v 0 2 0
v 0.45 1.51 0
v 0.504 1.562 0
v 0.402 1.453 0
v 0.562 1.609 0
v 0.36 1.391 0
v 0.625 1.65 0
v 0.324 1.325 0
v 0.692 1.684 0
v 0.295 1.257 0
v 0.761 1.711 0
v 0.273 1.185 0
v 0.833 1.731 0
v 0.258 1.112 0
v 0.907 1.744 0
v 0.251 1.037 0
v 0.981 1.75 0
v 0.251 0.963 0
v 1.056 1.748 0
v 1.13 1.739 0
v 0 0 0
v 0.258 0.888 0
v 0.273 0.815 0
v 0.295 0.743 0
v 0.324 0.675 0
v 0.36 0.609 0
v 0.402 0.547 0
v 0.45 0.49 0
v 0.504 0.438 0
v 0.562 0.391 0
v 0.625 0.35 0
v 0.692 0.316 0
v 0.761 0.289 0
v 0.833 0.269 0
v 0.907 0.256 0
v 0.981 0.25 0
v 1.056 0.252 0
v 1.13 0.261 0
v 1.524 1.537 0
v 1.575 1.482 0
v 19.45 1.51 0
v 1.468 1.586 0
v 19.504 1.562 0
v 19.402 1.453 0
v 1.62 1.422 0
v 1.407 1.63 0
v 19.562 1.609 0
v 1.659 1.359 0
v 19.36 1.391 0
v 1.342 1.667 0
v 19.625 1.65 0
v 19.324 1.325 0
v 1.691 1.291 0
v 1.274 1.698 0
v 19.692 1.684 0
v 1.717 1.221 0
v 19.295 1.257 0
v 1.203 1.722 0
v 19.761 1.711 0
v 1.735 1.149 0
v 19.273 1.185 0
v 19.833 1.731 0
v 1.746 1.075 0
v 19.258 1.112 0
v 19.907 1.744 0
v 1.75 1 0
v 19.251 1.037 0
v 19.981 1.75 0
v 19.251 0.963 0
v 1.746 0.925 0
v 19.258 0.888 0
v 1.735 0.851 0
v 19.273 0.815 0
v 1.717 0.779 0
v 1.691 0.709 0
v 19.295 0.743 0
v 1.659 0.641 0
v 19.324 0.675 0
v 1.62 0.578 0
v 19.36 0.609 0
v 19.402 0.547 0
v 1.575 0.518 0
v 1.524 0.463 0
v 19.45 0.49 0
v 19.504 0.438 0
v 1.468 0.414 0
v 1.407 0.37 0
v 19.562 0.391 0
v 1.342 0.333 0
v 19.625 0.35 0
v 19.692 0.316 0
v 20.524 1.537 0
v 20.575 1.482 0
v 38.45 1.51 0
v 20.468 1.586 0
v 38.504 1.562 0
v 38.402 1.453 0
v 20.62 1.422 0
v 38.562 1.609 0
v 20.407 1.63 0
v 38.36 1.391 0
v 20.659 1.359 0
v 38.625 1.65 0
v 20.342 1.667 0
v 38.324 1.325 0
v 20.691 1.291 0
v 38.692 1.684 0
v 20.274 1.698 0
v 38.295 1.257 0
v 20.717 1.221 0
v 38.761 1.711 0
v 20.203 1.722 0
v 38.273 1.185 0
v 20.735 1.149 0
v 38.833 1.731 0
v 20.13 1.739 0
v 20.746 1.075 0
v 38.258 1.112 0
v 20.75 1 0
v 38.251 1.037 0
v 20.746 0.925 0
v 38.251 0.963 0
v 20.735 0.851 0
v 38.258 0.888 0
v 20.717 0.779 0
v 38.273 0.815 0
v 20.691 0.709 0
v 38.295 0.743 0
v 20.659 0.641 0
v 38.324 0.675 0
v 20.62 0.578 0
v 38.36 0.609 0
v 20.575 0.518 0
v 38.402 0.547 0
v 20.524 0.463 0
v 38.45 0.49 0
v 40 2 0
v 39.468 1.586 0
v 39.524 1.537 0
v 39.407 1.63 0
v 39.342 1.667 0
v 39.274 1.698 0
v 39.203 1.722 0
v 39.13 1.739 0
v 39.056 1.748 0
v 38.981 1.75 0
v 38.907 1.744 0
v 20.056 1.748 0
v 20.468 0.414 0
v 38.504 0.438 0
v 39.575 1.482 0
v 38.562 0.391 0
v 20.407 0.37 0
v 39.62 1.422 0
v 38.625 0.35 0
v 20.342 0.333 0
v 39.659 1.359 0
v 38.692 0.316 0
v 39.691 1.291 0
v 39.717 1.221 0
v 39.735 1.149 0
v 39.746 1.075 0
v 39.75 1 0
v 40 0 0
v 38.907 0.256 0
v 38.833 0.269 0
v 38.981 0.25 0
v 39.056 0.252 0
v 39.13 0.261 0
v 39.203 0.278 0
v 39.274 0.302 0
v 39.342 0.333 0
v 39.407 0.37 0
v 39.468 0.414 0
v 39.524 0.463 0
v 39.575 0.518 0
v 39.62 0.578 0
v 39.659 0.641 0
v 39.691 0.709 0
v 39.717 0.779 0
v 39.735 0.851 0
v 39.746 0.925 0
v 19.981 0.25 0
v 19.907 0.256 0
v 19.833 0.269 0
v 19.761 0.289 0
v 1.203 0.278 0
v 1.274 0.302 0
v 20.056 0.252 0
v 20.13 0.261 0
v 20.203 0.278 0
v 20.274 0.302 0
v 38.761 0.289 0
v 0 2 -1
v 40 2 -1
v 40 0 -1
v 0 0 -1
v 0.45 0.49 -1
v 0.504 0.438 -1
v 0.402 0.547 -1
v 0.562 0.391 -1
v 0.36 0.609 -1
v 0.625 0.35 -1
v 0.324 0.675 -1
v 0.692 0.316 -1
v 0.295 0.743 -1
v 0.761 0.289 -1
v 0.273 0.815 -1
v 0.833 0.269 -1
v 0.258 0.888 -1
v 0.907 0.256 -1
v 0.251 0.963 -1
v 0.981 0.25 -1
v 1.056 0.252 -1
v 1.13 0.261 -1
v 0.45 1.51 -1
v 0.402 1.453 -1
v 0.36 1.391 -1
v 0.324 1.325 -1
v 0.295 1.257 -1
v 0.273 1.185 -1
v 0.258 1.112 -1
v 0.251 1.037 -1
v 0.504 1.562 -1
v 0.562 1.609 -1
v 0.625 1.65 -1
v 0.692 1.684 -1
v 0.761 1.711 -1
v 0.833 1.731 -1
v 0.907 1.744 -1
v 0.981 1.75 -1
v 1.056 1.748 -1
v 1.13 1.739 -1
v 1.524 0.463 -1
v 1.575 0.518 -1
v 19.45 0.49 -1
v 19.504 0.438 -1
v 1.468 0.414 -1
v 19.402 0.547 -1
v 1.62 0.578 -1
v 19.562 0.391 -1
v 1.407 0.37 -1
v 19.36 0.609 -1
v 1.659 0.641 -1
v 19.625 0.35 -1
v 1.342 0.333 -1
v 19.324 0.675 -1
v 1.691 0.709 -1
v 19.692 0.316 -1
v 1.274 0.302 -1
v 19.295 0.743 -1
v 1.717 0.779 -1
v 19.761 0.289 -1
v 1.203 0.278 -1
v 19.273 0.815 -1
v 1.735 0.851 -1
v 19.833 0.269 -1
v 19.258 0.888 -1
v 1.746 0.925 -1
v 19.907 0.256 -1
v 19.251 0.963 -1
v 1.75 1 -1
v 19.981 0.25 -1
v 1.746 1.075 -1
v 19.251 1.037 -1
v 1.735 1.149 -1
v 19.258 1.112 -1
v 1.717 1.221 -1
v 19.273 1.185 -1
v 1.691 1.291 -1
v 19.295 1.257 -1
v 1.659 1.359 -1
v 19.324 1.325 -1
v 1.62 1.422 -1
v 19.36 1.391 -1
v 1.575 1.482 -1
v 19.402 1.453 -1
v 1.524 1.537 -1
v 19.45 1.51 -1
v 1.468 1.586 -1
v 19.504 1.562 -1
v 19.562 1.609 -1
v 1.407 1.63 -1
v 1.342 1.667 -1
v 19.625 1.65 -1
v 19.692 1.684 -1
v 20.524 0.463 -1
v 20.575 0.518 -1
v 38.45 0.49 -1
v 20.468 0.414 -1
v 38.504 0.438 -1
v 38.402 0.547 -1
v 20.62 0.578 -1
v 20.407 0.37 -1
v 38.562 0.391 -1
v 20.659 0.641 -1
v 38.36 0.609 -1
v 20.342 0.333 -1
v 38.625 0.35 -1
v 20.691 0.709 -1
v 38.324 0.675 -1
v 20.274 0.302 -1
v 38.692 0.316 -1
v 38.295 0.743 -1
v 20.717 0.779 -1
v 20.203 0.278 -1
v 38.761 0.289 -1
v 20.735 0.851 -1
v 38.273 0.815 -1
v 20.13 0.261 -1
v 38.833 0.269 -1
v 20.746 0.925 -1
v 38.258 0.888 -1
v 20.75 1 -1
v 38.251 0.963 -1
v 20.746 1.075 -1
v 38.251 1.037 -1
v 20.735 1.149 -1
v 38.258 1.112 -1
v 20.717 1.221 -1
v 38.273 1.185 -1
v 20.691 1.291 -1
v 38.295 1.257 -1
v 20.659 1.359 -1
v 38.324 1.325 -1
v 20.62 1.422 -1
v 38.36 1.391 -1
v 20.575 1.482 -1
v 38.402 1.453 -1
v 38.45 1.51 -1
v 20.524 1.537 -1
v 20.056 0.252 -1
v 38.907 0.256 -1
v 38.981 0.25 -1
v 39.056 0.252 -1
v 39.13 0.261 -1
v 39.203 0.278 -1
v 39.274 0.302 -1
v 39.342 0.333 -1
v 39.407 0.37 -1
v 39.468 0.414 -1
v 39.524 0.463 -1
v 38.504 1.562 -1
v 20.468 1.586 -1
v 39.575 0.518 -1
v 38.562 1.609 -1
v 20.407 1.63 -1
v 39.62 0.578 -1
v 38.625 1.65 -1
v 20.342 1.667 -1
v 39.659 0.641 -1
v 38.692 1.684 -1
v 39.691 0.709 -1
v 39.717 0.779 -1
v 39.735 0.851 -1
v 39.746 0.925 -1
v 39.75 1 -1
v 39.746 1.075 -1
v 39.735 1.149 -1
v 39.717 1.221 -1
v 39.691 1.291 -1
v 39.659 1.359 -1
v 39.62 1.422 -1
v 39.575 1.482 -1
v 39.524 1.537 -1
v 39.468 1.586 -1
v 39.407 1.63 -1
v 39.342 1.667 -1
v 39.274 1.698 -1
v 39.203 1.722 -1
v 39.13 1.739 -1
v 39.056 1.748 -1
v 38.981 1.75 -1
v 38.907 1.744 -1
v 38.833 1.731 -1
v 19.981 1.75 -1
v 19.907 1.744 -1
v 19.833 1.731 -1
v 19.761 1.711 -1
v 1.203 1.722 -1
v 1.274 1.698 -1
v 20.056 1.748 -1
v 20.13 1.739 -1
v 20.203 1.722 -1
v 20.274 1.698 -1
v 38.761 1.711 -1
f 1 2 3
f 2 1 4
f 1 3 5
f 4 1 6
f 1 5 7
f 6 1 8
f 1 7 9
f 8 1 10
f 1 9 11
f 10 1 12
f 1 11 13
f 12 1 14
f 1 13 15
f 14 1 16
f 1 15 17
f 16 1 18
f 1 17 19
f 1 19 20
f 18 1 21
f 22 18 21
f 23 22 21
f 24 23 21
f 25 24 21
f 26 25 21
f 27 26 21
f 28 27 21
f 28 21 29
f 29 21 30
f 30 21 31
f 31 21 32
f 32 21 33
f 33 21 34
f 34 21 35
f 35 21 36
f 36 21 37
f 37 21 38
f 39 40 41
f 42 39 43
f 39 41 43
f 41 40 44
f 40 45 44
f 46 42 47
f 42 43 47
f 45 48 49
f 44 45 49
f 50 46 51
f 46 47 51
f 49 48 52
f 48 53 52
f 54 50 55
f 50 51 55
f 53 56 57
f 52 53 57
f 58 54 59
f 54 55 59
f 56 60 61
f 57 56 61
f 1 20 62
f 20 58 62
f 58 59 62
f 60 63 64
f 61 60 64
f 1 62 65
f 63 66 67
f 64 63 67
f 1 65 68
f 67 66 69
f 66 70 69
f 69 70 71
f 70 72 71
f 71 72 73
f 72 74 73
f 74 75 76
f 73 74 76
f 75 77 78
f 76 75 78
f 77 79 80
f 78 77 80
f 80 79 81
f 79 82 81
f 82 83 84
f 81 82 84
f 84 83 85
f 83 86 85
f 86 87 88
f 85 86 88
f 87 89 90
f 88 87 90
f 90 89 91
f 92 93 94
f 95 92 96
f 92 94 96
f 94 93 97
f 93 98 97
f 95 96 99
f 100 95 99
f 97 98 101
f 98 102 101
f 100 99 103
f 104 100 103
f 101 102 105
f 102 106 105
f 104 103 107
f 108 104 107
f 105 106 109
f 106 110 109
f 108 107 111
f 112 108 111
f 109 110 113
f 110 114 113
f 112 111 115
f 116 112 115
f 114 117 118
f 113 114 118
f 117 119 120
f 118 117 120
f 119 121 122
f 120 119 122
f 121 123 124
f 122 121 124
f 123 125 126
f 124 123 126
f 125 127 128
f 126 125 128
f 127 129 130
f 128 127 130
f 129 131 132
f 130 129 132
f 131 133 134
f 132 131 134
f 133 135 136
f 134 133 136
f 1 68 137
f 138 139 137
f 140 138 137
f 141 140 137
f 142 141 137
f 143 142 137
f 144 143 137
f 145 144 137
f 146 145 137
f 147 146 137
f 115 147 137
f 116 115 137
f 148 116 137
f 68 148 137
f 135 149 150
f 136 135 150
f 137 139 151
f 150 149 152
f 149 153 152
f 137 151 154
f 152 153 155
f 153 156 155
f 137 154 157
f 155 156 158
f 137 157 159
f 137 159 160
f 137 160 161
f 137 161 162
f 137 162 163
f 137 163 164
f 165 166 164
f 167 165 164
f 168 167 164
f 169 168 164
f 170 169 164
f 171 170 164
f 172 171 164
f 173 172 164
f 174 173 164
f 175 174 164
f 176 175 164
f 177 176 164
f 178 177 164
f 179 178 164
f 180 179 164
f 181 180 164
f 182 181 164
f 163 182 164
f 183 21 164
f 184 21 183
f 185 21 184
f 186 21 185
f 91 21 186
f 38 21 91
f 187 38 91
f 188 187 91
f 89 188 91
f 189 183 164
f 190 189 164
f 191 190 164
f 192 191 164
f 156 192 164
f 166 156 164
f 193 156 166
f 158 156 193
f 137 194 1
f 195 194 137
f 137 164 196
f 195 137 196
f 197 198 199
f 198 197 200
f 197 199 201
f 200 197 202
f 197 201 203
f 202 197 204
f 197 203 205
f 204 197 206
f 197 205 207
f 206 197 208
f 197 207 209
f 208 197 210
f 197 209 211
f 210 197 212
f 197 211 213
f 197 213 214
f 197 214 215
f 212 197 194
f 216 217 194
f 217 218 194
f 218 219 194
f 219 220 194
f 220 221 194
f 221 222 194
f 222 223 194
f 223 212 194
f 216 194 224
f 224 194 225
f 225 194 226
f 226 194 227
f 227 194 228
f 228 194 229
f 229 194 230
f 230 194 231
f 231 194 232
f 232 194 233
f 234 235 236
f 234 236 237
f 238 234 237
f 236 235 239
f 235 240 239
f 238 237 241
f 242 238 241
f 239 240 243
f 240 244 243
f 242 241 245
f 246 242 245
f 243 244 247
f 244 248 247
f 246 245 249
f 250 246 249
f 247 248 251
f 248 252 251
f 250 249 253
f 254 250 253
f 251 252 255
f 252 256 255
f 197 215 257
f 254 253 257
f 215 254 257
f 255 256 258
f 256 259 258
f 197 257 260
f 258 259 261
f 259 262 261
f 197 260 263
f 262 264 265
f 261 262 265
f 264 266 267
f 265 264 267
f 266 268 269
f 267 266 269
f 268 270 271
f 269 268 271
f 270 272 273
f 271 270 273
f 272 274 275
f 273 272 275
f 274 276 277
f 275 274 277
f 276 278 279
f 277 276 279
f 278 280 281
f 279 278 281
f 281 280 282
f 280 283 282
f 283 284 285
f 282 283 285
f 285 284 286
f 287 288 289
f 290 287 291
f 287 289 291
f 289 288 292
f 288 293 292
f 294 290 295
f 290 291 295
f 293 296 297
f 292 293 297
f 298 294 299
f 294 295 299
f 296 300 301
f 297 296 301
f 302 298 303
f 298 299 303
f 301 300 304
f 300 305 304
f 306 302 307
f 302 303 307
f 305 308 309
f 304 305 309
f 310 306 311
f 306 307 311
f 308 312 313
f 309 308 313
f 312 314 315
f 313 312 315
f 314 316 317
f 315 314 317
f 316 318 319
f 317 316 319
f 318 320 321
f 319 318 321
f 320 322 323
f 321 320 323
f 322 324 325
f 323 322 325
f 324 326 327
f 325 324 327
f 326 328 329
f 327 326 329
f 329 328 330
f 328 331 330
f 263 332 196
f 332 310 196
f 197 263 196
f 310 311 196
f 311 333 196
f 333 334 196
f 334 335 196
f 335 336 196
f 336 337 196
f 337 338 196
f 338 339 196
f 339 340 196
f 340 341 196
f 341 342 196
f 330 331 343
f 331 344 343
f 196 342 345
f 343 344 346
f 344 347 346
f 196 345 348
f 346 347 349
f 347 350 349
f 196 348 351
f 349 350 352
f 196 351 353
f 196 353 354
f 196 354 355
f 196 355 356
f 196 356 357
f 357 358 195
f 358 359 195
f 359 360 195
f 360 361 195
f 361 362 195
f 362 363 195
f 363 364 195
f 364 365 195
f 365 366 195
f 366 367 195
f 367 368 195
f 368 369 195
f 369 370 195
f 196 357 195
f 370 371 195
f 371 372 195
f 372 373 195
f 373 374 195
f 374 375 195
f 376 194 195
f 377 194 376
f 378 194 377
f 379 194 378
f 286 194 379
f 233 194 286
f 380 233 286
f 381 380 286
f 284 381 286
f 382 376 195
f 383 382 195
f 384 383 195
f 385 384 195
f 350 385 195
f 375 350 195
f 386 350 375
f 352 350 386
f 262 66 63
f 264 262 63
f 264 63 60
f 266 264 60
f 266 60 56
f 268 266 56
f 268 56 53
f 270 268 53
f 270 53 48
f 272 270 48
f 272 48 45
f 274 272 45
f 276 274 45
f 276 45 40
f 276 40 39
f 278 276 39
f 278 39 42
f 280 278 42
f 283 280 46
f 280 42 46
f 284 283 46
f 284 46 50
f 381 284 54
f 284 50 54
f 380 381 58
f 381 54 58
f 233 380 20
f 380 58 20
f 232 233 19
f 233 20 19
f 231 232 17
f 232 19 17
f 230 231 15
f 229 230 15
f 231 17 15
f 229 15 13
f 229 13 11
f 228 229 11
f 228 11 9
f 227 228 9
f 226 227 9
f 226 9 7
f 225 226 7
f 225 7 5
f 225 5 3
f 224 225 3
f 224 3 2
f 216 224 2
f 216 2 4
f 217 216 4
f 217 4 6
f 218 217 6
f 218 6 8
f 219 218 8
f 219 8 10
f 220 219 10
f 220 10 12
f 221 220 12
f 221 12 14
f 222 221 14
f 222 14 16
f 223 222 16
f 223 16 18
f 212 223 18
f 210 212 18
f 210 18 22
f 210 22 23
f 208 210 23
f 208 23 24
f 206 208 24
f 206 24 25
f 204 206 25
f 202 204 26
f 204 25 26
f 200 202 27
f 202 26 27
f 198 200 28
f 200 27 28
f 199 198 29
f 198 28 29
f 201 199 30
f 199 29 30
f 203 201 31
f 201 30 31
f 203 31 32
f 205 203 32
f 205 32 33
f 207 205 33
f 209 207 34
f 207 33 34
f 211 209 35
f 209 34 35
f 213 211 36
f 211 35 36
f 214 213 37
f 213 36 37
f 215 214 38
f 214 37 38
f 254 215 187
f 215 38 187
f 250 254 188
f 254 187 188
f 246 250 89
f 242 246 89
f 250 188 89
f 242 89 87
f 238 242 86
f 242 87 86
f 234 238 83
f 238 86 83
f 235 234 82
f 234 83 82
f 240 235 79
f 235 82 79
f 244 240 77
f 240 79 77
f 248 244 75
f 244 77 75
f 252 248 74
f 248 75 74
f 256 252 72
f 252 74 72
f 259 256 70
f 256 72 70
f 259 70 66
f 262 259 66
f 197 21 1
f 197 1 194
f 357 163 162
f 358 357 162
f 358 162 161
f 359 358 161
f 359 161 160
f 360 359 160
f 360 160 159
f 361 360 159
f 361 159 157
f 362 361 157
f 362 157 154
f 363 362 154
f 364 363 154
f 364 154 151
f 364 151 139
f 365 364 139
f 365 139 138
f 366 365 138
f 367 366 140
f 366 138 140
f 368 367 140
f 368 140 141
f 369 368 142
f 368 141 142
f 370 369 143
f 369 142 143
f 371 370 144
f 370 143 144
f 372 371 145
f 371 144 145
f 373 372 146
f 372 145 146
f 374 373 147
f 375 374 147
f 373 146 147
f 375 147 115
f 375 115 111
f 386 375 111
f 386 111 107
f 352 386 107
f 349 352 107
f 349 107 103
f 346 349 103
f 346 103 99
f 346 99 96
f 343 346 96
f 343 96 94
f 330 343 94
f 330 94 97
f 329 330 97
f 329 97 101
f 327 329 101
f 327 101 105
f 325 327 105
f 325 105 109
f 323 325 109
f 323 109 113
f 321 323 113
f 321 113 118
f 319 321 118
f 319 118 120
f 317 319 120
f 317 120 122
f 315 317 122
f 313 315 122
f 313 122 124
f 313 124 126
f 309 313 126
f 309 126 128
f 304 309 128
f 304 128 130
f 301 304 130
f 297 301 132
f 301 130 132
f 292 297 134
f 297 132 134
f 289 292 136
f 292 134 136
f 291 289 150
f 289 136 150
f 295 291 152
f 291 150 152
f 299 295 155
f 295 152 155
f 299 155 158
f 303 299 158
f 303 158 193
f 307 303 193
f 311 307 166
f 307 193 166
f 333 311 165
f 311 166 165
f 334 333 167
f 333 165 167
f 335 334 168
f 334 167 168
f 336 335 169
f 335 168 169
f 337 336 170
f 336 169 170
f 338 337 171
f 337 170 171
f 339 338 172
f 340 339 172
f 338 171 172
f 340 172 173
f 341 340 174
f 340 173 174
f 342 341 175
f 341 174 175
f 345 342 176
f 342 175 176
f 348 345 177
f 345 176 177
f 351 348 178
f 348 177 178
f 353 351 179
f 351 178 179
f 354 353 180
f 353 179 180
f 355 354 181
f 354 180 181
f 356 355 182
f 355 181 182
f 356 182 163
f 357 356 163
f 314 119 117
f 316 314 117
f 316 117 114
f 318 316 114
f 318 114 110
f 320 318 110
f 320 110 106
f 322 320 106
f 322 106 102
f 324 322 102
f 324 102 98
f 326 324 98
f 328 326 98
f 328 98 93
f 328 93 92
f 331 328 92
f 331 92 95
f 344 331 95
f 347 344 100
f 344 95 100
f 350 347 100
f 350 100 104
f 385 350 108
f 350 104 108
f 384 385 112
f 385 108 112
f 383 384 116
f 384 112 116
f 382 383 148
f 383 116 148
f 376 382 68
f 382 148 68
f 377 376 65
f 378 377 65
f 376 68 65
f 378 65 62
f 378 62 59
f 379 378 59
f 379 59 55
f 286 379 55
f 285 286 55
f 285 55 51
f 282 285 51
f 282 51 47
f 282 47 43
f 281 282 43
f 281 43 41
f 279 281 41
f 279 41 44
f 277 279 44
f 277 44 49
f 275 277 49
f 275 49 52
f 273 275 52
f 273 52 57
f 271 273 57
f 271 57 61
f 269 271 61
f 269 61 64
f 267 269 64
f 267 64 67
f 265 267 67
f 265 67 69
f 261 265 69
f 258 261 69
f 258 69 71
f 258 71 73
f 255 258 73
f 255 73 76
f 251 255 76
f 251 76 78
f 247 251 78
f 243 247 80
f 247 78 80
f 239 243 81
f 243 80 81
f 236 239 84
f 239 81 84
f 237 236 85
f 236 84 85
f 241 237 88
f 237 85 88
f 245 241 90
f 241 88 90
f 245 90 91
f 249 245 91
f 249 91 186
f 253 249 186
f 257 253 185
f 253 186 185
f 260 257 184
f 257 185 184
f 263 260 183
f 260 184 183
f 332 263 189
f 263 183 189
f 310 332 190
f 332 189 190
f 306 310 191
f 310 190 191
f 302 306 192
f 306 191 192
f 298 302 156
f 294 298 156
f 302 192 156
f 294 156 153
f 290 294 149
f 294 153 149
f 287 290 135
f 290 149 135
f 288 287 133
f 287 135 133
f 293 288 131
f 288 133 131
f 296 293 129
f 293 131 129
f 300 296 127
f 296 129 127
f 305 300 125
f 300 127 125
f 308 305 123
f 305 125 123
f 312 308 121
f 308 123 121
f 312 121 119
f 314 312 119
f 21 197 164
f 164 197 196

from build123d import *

# Parameters (mm, degrees)
SKETCH1_W           = 40
SKETCH1_H           = 10
BOSS_EXTRUDE1_DEPTH = 2
SKETCH4_W           = 40
SKETCH4_H           = 9
CUT_EXTRUDE2_DEPTH  = 2
SKETCH5_R           = 0.75
CUT_EXTRUDE3_DEPTH  = 41.062451248


with BuildPart() as part:
    # Sketch1 → Boss-Extrude1 (new body)
    with BuildSketch(Plane(origin=(0, 0, 0), x_dir=(1, 0, 0), z_dir=(0, 1, 0))):
        with Locations((20, 5)):
            Rectangle(SKETCH1_W, SKETCH1_H)
    extrude(amount=BOSS_EXTRUDE1_DEPTH)

    # Sketch4 → Cut-Extrude2 (cut)
    with BuildSketch(Plane(origin=(0, 2, 0), x_dir=(1, 0, 0), z_dir=(0, 1, 0))):
        with Locations((20, 5.5)):
            Rectangle(SKETCH4_W, SKETCH4_H)
    extrude(amount=-CUT_EXTRUDE2_DEPTH, mode=Mode.SUBTRACT)

    # Sketch5 → Cut-Extrude3 (cut, through all)
    with BuildSketch(Plane.XY):
        with Locations((20, 1)):
            Circle(SKETCH5_R)
        with Locations((1, 1)):
            Circle(SKETCH5_R)
        with Locations((39, 1)):
            Circle(SKETCH5_R)
    extrude(amount=-CUT_EXTRUDE3_DEPTH, mode=Mode.SUBTRACT)


solid = part.part
